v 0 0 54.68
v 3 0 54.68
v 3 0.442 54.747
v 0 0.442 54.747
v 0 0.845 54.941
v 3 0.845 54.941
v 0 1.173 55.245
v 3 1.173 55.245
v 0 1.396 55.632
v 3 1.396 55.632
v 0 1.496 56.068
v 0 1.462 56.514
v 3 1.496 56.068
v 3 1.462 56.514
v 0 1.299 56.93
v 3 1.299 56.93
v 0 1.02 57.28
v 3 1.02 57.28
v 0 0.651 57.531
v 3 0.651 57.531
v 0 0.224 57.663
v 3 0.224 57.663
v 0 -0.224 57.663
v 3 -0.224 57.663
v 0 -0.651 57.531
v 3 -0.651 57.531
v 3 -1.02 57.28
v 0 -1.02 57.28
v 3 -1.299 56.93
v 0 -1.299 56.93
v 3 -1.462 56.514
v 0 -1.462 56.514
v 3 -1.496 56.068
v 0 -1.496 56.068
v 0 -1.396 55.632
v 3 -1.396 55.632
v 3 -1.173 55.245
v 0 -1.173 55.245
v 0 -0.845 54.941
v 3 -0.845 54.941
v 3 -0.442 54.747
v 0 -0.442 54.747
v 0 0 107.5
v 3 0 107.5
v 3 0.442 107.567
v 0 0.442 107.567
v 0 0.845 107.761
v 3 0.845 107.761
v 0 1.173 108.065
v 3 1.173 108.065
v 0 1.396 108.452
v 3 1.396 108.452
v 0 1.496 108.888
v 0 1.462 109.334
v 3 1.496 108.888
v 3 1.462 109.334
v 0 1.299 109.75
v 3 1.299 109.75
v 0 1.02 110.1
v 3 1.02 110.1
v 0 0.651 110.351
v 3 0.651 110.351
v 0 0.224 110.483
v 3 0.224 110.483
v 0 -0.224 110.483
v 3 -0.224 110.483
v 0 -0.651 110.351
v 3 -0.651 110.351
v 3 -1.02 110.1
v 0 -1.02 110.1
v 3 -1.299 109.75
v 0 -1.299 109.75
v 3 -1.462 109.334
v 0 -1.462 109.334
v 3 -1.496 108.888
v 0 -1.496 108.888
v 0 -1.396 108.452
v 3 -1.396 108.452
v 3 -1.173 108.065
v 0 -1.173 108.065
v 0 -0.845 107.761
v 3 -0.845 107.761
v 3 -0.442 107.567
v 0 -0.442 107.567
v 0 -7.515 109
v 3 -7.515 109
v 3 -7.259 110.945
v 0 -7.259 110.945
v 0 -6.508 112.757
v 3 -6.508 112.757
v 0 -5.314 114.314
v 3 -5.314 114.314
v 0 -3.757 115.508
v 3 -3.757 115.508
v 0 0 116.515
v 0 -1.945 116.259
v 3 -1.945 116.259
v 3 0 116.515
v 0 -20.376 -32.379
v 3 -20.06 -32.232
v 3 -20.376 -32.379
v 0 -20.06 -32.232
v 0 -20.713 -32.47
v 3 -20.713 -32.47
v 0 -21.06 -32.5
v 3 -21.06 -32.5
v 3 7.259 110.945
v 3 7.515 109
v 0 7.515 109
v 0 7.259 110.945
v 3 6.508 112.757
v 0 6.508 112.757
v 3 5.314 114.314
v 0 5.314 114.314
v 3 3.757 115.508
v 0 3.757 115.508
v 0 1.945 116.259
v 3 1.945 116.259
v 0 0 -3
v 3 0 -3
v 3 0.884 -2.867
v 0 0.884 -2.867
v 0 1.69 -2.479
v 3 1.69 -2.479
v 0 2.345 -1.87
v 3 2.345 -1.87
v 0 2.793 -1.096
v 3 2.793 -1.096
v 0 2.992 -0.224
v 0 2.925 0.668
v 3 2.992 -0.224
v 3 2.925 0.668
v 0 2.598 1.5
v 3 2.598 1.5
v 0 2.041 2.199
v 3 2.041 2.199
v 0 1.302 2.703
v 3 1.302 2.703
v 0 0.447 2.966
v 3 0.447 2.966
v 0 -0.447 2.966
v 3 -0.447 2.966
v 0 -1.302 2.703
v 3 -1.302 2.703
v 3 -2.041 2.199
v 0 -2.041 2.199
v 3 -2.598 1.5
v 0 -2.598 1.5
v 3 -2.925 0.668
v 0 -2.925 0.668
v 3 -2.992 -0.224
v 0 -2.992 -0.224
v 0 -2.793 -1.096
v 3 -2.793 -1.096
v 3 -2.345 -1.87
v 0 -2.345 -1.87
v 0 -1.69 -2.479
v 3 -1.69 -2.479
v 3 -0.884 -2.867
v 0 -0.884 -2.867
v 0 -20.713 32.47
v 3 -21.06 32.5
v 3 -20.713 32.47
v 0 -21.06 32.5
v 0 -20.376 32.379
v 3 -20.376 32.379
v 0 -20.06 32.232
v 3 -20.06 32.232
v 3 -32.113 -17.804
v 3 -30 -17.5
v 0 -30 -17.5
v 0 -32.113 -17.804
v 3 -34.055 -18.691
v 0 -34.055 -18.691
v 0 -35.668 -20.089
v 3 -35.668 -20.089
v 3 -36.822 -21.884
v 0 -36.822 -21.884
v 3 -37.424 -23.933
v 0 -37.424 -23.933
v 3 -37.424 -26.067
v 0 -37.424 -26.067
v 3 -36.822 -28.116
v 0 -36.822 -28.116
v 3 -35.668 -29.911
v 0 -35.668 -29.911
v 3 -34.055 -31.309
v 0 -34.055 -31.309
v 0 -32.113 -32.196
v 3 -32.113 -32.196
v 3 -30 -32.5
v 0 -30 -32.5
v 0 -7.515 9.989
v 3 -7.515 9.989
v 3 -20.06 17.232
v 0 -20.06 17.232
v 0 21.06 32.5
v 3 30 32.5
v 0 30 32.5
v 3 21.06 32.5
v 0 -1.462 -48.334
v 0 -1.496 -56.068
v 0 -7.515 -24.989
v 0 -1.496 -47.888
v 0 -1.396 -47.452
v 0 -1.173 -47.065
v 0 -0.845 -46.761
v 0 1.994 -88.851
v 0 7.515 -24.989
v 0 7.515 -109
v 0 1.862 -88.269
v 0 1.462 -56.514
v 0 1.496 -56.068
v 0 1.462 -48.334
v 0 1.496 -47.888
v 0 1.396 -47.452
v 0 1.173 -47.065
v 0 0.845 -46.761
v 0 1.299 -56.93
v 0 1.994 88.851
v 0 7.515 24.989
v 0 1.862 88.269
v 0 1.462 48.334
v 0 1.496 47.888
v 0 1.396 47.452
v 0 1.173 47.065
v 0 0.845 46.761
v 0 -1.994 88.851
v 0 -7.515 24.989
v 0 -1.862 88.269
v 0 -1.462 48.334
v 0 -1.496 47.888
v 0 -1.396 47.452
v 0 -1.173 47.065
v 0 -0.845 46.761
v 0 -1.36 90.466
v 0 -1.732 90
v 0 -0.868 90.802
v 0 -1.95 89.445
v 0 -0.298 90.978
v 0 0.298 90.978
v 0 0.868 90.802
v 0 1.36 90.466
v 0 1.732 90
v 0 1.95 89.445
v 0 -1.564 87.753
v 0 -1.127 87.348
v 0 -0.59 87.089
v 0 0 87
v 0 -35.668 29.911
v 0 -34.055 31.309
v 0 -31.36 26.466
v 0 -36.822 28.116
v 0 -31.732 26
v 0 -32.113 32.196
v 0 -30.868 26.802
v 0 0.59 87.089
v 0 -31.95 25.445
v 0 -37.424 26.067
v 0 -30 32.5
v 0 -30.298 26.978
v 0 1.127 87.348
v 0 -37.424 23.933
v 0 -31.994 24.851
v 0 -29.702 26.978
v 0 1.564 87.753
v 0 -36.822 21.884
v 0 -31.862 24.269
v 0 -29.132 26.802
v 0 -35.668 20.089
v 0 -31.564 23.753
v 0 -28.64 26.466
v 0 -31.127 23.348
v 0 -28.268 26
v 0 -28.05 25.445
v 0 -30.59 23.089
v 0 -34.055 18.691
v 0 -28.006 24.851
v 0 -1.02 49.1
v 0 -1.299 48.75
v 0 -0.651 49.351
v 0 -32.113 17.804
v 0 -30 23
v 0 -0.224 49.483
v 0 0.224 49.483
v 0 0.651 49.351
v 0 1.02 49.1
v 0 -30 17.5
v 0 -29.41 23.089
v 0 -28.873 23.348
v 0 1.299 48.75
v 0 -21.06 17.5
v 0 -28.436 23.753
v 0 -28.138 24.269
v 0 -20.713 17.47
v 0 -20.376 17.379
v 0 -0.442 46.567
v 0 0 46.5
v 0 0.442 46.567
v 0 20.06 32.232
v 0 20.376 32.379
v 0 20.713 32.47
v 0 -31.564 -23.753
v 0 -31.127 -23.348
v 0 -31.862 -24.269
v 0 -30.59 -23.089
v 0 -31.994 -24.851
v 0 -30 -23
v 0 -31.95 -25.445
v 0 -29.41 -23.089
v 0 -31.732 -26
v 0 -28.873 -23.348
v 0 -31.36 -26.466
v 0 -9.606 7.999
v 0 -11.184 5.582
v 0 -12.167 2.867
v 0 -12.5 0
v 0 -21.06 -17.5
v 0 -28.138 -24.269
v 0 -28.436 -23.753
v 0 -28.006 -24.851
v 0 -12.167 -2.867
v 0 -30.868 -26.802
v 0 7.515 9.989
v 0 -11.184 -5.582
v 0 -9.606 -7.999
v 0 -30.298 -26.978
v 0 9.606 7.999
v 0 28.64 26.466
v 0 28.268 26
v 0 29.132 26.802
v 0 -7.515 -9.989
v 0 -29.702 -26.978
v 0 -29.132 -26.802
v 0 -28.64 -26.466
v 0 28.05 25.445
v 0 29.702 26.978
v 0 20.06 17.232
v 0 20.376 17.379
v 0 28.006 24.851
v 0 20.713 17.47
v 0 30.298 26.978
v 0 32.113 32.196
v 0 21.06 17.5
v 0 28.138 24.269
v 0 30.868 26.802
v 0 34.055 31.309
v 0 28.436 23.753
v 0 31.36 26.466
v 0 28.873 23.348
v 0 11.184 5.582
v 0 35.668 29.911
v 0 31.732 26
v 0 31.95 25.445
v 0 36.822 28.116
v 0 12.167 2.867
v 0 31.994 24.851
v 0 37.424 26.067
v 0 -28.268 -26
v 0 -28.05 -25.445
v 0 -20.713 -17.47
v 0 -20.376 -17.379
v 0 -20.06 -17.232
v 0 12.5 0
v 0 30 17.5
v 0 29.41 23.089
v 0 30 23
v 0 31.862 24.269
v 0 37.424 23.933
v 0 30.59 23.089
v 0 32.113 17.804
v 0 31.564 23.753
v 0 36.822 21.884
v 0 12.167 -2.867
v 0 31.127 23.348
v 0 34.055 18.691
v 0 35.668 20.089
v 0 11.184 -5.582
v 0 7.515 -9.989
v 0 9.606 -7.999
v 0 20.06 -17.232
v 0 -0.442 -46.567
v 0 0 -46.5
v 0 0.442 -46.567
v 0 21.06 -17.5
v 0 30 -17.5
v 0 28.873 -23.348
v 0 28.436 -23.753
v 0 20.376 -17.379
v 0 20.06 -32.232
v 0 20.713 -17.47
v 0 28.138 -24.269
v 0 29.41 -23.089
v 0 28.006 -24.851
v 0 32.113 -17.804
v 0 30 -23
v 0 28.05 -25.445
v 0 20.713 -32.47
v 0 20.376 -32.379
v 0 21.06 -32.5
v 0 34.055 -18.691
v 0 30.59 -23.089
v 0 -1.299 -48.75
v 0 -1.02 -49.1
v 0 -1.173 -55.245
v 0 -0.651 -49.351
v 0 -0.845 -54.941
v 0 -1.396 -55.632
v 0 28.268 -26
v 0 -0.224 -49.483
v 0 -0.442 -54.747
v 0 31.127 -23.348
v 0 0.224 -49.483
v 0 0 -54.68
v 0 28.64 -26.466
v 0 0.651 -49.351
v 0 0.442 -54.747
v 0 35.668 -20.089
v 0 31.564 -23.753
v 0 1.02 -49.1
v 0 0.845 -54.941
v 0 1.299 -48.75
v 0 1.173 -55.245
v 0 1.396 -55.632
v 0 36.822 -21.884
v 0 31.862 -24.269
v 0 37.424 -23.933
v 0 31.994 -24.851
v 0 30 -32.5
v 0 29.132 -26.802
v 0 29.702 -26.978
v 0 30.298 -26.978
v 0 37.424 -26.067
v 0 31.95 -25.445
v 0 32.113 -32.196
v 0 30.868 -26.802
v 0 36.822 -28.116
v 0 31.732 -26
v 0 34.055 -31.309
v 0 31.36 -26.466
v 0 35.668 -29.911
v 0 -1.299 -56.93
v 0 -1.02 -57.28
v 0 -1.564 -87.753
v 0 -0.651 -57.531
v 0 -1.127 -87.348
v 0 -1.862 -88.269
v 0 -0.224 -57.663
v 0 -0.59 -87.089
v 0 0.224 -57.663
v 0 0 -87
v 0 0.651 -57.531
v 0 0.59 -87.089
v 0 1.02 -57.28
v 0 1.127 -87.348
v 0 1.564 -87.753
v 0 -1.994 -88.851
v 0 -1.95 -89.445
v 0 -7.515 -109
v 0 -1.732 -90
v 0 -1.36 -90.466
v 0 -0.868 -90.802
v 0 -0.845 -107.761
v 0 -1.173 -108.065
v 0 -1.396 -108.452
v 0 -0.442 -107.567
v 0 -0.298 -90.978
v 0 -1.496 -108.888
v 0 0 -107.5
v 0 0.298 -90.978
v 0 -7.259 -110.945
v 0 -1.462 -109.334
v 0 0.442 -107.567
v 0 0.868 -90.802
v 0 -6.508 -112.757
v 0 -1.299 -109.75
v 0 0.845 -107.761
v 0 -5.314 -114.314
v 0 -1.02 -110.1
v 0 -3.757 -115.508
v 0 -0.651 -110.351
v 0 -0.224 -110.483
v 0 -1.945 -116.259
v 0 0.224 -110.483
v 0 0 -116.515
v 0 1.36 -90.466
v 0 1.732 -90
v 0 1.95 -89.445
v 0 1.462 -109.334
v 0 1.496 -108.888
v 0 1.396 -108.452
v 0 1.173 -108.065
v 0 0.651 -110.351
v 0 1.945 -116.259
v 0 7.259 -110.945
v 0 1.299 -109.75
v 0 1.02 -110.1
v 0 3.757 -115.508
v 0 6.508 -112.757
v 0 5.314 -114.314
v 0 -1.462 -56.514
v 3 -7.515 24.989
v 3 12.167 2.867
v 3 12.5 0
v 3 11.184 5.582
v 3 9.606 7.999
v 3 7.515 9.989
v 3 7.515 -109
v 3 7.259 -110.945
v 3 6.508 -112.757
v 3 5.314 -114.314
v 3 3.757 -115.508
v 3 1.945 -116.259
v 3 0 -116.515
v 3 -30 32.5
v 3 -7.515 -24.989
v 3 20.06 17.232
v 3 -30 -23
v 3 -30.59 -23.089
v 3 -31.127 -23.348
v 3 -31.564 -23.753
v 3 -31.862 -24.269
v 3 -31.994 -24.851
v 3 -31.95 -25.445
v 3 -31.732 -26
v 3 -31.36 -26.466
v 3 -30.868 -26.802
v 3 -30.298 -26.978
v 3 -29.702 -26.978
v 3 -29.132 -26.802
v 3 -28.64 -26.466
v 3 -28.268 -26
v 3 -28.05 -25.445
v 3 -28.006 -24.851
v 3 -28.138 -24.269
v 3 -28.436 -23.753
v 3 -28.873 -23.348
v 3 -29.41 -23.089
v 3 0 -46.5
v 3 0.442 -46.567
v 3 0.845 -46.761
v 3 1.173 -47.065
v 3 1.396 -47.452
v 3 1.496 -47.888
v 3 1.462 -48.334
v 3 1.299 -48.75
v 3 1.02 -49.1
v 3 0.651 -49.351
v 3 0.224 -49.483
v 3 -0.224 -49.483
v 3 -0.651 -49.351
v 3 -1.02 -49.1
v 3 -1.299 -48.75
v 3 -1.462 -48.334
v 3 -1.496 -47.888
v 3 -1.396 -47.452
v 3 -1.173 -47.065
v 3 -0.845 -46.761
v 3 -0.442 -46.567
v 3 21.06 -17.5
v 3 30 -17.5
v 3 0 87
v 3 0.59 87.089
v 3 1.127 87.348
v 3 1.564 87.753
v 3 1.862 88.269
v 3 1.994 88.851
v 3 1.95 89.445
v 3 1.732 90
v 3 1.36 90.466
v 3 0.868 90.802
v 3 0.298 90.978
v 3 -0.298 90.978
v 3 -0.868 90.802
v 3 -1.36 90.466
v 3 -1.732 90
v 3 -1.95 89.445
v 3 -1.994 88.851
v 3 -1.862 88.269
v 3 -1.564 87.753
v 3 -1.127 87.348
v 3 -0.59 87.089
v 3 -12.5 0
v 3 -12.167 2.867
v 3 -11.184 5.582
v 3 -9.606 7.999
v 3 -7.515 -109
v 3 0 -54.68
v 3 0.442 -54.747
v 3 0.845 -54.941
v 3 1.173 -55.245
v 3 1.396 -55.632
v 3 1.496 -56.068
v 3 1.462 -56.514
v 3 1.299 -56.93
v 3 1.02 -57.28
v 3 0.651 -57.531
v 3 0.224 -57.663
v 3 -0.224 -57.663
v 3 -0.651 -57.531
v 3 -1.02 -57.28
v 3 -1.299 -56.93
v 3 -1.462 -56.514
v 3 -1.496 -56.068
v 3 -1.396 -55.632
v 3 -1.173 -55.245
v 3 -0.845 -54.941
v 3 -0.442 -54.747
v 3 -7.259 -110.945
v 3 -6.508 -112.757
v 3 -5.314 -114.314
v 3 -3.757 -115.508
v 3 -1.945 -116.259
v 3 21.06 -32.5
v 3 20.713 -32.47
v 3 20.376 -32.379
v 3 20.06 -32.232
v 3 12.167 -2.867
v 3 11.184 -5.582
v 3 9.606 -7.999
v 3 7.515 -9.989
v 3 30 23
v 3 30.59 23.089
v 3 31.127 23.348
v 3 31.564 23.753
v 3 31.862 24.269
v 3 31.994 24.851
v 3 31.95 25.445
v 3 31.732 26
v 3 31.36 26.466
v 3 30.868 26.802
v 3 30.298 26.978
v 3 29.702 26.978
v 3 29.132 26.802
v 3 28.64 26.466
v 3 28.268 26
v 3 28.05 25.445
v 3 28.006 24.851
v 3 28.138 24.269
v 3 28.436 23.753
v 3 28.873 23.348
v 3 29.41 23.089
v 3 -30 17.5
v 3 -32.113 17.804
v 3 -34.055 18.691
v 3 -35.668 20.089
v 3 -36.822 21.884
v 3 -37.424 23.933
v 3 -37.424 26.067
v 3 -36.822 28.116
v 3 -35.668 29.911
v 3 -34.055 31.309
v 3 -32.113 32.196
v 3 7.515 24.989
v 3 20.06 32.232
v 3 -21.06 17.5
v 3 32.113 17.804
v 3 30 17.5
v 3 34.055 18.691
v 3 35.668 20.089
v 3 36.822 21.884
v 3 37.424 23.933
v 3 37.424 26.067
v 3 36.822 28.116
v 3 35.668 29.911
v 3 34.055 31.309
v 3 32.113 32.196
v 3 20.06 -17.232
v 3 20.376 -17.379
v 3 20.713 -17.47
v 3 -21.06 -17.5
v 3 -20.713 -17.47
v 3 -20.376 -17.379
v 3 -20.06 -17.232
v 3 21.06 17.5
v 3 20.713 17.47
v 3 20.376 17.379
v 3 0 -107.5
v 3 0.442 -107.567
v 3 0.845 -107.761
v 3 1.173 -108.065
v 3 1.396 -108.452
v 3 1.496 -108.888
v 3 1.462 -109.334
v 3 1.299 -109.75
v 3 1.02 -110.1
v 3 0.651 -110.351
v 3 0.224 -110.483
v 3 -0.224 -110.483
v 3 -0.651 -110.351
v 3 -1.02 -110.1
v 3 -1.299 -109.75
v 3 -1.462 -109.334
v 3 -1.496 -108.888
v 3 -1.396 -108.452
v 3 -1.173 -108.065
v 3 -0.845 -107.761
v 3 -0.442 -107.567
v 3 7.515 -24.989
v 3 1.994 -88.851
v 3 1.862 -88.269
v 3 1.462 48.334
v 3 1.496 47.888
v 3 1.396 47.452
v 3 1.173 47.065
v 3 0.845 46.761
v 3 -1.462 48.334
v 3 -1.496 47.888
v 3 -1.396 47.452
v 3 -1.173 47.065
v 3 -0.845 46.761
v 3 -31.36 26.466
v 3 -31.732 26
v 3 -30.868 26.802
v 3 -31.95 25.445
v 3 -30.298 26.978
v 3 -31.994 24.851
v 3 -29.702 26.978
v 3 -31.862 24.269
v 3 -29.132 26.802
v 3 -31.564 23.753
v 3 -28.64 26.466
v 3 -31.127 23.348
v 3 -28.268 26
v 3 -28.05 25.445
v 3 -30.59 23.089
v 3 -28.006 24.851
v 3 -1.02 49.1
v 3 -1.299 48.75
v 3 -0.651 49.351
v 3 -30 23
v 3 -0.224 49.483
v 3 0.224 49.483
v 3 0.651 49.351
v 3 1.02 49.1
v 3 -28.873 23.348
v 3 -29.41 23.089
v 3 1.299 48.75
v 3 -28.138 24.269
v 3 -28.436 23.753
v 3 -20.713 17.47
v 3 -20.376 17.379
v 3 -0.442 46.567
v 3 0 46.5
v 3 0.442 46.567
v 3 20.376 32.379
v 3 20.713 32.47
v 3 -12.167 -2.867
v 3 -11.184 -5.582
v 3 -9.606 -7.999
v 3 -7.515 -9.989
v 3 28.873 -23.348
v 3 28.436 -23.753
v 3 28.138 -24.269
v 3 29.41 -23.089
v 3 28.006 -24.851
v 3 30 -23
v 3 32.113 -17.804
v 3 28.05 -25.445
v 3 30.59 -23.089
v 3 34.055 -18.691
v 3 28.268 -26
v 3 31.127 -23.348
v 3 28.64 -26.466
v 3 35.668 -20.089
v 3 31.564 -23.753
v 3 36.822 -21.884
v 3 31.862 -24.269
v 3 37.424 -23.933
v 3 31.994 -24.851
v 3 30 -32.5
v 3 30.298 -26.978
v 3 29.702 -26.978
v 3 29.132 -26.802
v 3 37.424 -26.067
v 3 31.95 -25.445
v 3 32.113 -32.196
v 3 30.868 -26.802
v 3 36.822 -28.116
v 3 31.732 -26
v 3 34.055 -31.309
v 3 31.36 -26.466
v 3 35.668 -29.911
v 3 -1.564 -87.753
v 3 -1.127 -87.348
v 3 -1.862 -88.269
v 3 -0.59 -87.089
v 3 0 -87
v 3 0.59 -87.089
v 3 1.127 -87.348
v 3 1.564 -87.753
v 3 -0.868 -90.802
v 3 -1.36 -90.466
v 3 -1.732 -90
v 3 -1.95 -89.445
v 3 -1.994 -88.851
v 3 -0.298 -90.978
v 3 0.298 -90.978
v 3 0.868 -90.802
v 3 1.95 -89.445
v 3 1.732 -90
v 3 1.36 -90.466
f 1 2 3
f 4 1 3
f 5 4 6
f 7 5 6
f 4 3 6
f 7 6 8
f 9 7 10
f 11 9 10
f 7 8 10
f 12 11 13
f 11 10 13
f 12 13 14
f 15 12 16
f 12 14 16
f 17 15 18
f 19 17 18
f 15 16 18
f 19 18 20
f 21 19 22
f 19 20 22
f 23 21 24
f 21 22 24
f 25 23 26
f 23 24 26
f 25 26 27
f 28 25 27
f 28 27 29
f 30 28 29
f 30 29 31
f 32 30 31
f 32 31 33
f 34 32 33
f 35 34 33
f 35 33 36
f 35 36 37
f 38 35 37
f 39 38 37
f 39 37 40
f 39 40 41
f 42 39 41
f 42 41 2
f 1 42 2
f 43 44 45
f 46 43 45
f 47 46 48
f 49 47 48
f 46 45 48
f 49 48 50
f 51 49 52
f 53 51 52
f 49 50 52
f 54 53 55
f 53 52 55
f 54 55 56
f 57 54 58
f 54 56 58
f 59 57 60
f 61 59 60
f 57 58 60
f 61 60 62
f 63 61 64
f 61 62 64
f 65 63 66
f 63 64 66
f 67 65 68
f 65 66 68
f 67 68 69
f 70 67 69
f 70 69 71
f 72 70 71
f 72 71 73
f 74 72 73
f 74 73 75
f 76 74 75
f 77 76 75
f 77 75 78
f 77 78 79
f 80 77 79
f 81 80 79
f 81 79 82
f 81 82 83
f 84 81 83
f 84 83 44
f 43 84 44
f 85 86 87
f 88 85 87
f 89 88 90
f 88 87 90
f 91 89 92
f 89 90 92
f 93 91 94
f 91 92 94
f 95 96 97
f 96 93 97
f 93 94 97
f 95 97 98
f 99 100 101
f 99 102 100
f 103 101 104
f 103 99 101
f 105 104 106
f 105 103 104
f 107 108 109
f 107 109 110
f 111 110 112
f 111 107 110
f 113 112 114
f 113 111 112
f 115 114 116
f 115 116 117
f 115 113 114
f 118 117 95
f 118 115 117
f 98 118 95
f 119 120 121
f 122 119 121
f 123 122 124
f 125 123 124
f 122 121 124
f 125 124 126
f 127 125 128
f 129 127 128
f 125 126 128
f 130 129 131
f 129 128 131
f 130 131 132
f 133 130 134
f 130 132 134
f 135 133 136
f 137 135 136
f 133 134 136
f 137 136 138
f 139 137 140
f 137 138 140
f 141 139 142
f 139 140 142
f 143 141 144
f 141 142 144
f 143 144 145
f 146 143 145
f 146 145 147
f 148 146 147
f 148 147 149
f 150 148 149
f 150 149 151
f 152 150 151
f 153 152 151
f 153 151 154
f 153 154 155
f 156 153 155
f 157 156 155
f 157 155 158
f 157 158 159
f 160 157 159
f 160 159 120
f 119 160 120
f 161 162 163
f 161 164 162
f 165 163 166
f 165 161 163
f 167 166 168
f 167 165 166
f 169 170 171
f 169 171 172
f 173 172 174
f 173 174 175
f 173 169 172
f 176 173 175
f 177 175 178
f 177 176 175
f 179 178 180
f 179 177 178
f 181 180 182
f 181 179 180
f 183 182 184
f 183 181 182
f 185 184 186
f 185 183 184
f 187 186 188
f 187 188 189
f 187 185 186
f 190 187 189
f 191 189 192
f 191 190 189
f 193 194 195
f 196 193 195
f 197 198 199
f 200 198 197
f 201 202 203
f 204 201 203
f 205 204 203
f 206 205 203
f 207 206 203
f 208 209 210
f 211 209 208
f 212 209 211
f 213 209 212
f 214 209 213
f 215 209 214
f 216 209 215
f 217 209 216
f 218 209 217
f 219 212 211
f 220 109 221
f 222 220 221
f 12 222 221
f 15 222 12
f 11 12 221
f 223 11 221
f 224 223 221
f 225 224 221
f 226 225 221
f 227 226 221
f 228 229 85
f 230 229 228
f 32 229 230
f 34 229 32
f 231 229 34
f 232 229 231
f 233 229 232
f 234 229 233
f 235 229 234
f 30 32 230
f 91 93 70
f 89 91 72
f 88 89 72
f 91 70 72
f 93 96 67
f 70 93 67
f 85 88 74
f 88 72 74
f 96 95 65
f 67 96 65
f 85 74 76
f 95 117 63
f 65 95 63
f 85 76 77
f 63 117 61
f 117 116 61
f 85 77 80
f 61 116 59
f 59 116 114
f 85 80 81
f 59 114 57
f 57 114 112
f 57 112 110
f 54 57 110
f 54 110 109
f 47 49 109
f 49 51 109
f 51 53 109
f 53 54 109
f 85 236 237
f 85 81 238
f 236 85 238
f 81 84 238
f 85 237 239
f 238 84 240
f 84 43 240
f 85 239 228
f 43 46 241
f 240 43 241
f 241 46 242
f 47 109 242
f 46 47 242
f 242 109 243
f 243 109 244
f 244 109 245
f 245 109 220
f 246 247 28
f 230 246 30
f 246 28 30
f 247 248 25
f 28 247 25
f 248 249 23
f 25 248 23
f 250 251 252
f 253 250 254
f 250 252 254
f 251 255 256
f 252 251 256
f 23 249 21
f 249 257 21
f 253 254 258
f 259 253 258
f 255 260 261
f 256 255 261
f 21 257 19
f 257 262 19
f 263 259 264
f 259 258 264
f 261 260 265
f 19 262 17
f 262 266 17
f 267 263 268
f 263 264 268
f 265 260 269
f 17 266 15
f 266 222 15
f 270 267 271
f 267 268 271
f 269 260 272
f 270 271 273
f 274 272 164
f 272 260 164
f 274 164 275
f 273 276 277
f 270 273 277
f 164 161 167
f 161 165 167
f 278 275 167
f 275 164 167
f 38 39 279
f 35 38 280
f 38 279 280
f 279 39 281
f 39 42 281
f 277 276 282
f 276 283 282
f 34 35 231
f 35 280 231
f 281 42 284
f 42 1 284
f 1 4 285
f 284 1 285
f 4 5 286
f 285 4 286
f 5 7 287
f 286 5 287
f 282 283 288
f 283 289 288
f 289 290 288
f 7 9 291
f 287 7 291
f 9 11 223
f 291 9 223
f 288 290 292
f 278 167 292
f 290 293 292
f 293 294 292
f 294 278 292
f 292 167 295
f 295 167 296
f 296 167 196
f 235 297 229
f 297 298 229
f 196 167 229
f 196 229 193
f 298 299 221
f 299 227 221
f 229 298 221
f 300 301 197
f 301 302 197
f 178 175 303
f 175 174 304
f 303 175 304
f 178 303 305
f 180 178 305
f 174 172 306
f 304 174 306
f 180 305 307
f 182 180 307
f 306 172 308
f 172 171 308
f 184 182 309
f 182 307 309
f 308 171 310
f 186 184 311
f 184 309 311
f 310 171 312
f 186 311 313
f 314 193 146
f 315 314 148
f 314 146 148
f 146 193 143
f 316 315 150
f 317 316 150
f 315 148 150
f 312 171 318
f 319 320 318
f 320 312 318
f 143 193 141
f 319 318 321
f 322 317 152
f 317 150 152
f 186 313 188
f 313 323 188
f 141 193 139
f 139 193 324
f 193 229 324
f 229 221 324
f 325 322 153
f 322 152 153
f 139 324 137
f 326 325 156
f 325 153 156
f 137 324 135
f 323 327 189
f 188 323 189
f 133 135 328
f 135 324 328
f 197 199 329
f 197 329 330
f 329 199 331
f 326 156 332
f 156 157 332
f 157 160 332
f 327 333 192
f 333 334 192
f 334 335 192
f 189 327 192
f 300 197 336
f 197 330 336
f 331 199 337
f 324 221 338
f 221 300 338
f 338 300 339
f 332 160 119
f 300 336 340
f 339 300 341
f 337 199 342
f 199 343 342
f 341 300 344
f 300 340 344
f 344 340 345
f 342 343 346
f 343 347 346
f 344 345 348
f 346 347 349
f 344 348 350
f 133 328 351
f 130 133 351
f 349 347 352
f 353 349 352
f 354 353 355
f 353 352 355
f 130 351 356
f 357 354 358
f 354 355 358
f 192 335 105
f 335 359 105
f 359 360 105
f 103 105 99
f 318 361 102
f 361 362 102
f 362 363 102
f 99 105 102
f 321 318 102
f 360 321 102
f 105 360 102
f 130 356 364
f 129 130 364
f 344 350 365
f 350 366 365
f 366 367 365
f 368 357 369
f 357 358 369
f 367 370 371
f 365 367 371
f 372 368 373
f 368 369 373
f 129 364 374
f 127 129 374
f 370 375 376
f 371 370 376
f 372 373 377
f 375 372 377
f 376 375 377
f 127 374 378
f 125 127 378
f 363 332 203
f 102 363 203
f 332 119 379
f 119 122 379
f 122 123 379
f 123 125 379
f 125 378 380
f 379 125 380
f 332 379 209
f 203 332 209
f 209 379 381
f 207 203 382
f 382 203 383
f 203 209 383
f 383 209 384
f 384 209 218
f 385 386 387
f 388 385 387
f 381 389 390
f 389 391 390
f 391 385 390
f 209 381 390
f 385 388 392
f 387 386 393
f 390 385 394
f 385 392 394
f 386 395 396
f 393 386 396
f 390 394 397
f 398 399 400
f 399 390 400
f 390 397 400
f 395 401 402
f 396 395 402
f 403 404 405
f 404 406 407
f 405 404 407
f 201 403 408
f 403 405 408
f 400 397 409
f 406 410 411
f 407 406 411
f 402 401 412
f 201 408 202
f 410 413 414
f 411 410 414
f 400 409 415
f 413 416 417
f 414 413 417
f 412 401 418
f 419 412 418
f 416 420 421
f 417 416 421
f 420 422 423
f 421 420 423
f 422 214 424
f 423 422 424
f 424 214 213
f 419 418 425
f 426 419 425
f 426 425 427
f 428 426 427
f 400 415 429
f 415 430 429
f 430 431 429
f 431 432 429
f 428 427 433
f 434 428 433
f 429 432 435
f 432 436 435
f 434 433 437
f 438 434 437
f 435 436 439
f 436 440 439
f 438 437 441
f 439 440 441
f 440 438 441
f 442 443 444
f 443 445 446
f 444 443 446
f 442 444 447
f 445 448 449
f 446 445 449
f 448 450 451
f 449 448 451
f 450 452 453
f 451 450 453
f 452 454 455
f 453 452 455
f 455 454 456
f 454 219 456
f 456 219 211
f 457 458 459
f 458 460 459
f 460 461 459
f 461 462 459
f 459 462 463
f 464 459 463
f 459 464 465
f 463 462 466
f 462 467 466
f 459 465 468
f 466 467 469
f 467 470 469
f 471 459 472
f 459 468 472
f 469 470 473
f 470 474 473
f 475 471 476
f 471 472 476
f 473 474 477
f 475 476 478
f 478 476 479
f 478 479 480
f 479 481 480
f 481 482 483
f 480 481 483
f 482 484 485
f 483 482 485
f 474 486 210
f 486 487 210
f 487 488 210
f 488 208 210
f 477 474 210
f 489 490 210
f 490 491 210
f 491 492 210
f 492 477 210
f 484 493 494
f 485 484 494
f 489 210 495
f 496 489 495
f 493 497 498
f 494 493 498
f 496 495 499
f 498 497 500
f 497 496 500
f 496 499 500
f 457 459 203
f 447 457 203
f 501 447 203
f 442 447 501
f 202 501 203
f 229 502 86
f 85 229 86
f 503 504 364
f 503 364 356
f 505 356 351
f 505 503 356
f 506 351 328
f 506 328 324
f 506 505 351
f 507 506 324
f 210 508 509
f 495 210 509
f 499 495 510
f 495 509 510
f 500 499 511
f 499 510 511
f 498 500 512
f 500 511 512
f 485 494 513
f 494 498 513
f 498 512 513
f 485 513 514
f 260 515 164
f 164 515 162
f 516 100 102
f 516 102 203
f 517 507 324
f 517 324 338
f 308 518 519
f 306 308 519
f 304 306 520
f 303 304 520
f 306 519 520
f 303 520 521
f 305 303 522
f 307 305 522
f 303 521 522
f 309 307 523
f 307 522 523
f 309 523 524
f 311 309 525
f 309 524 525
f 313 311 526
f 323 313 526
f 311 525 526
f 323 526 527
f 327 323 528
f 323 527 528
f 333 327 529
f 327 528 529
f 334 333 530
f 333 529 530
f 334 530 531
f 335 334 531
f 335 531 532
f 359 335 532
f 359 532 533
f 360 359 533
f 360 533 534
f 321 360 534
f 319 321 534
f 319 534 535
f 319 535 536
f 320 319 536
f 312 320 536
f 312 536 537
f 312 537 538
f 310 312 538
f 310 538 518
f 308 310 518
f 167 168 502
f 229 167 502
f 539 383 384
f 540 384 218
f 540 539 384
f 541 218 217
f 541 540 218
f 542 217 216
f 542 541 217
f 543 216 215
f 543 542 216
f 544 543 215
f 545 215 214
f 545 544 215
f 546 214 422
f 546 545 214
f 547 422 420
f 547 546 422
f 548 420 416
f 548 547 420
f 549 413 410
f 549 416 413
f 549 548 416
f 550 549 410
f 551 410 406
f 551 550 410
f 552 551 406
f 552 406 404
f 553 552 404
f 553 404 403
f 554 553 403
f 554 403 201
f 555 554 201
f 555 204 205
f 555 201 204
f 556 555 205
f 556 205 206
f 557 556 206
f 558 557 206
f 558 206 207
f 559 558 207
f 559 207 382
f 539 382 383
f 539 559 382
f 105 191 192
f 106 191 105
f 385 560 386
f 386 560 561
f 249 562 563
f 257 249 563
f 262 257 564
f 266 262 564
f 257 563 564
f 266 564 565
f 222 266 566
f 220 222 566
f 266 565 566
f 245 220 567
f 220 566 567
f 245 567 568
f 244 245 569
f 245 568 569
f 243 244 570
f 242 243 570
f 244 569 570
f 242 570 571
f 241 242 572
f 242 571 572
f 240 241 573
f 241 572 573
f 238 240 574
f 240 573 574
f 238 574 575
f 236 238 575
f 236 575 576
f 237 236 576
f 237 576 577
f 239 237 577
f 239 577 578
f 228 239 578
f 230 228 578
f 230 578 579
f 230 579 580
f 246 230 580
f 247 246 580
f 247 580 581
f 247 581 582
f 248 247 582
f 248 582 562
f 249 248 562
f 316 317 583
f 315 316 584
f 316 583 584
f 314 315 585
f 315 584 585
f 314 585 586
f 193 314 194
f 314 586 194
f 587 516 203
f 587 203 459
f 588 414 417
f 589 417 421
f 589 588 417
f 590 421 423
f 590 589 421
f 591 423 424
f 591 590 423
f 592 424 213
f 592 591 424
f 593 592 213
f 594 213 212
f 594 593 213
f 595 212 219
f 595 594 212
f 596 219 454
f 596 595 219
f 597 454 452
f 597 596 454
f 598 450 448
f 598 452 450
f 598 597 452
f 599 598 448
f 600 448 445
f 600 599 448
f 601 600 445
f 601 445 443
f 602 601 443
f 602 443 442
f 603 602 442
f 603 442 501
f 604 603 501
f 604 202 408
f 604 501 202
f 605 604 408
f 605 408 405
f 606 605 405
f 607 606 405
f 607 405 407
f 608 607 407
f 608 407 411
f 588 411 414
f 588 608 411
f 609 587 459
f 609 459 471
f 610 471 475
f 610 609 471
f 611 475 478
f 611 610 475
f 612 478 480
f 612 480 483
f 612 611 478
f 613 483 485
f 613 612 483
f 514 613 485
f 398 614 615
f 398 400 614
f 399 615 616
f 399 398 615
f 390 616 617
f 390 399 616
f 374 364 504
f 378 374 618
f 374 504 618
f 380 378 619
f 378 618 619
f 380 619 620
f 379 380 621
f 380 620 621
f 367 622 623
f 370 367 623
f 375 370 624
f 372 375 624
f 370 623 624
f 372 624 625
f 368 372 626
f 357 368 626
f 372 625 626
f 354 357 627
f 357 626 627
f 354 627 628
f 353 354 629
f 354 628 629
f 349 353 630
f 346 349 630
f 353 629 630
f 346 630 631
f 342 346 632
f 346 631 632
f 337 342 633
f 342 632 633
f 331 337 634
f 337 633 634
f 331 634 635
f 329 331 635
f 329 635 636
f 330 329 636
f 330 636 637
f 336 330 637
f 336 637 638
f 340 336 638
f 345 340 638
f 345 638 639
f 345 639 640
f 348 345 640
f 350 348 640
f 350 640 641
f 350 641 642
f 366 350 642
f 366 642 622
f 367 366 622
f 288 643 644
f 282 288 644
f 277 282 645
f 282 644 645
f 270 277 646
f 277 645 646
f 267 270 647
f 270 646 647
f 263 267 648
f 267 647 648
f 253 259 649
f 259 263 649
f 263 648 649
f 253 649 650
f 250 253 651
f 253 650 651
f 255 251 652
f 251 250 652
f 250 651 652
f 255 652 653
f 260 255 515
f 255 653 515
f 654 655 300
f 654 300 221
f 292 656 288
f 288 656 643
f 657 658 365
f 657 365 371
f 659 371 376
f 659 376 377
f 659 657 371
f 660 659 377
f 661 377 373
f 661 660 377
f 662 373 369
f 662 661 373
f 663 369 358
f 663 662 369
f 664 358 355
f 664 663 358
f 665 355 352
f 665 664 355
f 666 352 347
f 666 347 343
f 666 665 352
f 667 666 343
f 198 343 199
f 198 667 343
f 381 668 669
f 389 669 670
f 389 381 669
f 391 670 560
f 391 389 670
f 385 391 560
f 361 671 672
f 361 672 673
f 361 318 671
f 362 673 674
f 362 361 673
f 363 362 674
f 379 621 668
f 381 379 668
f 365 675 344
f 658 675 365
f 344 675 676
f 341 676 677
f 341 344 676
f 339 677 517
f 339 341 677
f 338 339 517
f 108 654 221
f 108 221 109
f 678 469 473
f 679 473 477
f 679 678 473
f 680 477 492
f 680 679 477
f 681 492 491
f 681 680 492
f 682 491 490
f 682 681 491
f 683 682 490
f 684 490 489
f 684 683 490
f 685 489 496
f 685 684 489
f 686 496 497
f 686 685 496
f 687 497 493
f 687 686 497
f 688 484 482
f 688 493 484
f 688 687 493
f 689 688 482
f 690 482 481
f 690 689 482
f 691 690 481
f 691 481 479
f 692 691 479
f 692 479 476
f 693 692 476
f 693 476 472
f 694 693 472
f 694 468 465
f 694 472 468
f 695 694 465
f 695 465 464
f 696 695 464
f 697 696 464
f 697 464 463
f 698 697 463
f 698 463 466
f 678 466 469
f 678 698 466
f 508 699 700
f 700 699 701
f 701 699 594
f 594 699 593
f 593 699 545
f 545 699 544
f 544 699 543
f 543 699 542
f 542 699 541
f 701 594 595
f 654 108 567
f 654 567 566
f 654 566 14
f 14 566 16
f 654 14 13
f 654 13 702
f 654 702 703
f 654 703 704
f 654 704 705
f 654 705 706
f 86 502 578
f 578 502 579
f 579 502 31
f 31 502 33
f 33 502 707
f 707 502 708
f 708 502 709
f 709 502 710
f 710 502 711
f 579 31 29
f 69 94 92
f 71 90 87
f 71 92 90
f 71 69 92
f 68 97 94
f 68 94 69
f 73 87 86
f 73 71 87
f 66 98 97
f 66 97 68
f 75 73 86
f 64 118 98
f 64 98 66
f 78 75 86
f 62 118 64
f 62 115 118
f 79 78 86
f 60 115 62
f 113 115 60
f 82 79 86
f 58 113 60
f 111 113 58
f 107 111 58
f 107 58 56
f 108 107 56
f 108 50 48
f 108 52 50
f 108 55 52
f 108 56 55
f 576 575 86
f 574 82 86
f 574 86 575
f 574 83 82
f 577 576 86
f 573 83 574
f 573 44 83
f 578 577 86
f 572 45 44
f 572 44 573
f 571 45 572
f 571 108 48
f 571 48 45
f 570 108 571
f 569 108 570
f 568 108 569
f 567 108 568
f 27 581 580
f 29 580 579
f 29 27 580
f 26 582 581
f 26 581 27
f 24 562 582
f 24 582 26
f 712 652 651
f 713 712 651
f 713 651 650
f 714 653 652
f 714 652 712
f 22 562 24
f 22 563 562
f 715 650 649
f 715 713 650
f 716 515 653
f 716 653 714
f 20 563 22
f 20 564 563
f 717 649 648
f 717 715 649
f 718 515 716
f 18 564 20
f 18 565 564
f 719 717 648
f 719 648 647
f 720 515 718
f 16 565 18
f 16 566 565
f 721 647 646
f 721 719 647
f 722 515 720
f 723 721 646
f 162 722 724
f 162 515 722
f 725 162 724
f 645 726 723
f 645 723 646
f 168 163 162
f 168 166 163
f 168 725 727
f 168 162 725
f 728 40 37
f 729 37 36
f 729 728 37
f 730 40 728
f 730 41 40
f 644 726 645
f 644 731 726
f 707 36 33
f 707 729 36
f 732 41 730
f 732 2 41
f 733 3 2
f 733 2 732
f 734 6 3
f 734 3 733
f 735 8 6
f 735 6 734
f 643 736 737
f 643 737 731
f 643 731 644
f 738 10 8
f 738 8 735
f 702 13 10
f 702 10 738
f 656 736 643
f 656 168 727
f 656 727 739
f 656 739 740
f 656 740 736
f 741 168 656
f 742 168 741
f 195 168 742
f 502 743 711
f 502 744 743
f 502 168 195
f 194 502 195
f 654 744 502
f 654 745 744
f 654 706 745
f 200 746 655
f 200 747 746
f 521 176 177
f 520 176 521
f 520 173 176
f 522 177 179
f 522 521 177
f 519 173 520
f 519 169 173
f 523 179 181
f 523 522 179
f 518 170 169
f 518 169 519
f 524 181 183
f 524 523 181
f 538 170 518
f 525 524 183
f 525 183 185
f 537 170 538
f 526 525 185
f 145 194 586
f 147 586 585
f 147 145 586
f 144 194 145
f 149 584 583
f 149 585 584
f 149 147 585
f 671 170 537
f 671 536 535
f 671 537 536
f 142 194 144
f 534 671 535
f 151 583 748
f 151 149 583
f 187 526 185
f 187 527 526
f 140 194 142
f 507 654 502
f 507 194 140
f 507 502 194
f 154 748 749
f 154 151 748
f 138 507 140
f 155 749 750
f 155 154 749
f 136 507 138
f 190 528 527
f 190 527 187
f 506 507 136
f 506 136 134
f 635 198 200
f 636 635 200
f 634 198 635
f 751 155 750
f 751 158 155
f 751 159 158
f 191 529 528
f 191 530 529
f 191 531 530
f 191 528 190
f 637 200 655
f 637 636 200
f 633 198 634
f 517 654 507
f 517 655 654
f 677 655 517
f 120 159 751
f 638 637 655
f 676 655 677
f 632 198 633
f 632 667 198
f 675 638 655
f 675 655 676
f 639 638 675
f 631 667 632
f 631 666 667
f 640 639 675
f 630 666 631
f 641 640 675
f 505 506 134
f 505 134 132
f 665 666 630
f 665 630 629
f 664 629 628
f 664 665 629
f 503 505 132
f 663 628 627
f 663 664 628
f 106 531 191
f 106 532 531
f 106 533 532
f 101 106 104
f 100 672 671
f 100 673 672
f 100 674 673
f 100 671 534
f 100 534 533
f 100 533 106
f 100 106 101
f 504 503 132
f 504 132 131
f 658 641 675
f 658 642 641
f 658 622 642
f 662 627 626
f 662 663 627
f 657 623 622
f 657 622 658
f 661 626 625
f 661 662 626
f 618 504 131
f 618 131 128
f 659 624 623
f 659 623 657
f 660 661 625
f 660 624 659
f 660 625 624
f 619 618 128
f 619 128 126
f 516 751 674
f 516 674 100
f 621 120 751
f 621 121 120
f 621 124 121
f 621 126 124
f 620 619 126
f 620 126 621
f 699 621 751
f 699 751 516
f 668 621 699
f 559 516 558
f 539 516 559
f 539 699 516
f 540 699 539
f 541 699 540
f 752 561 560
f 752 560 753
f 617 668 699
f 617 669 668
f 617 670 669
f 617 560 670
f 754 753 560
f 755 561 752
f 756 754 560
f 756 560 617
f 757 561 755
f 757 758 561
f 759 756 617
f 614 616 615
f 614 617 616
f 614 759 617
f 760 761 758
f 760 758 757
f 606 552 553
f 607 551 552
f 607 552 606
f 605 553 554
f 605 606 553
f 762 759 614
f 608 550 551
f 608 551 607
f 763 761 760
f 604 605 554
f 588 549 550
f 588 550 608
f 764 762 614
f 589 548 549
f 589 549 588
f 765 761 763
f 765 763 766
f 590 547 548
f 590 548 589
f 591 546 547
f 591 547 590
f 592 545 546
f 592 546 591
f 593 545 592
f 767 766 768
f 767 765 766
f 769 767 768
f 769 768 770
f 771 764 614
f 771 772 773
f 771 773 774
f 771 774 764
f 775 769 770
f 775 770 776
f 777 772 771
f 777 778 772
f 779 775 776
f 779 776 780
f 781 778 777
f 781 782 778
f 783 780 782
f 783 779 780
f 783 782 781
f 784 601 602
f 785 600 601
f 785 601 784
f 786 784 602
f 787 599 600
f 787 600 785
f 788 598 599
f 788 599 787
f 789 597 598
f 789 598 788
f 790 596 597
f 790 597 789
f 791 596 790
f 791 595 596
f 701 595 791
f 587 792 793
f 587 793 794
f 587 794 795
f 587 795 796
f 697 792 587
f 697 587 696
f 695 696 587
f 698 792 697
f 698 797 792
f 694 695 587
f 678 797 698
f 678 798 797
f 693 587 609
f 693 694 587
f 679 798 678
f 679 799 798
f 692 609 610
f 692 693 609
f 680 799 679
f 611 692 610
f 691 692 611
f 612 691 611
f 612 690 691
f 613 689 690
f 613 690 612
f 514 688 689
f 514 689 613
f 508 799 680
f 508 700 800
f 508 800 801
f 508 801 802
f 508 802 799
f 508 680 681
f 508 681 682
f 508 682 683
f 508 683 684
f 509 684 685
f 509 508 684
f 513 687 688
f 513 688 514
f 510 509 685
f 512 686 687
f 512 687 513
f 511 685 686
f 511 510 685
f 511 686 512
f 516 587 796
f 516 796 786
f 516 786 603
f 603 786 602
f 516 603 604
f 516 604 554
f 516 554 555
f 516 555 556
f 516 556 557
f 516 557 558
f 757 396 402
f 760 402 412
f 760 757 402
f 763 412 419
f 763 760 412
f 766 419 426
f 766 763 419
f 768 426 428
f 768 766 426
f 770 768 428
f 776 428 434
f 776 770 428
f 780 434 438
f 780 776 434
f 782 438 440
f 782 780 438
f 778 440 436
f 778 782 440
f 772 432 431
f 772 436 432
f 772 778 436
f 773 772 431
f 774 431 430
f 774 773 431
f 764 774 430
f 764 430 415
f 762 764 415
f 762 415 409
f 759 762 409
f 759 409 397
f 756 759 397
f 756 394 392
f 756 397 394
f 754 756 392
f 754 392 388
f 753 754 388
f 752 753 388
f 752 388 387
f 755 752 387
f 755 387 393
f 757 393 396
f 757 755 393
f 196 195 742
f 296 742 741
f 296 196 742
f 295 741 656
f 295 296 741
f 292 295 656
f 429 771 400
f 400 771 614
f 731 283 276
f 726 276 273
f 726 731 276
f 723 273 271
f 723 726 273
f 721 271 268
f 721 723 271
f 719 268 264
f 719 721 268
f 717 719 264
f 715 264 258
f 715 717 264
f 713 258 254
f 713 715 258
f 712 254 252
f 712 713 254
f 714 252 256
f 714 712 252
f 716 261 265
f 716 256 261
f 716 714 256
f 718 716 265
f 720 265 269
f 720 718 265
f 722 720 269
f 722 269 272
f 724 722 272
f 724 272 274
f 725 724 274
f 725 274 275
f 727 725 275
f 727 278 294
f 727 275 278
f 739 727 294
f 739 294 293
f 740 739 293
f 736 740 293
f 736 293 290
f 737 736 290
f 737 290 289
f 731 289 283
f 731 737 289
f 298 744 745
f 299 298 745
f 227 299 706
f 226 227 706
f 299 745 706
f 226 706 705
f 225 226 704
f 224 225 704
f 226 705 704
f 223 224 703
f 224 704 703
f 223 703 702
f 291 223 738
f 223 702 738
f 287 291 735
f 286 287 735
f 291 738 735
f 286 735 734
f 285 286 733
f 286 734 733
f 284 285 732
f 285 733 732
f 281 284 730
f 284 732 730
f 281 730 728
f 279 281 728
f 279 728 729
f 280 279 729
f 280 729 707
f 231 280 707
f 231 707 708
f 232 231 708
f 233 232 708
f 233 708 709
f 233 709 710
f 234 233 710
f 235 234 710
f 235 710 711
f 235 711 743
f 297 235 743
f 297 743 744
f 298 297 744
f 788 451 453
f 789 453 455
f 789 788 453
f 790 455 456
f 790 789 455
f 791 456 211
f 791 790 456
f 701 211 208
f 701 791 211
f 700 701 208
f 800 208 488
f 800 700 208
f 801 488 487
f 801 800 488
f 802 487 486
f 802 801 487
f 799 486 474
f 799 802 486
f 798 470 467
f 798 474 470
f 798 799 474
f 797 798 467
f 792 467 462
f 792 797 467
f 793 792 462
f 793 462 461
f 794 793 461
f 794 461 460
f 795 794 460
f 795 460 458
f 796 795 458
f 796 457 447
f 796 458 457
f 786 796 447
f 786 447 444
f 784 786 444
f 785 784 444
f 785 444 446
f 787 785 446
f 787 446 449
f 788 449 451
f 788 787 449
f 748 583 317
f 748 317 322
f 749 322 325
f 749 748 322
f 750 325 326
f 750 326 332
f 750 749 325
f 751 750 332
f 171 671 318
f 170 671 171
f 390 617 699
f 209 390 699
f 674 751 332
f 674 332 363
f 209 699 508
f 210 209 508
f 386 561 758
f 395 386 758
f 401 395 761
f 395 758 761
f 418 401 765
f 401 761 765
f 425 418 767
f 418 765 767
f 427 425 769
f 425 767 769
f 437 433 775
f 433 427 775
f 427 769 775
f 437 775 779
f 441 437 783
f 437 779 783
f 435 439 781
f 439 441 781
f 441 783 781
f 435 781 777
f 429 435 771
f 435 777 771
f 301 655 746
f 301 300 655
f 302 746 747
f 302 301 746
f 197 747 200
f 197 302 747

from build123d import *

# Parameters (mm, degrees)
SKETCH1_W               = 250
SKETCH1_H               = 90
BOSS_EXTRUDE1_DEPTH     = 3
SKETCH2_R               = 3
SKETCH2_R_2             = 1.5
SKETCH2_R_3             = 2
CUT_EXTRUDE1_DEPTH      = 4
SKETCH3_R               = 2
CUT_EXTRUDE2_DEPTH      = 4
CUT_EXTRUDE3_DEPTH      = 4
MIRROR2_COPY_1_SKETCH_R = 2
MIRROR2_COPY_1_DEPTH    = 4
MIRROR2_COPY_2_DEPTH    = 4
FILLET2_R               = 2


with BuildPart() as part:
    # Sketch1 → Boss-Extrude1 (new body)
    with BuildSketch(Plane(origin=(0, 0, 0), x_dir=(0, 0, -1), z_dir=(1, 0, 0))):
        Rectangle(SKETCH1_W, SKETCH1_H)
    extrude(amount=BOSS_EXTRUDE1_DEPTH)

    # Sketch2 → Cut-Extrude1 (cut, through all)
    with BuildSketch(Plane(origin=(3, 0, 0), x_dir=(0, 0, -1), z_dir=(1, 0, 0))):
        Circle(SKETCH2_R)
        with Locations((-48, 0)):
            Circle(SKETCH2_R_2)
        with Locations((-89, 0)):
            Circle(SKETCH2_R_3)
        with Locations((-109, 0)):
            Circle(SKETCH2_R_2)
        with Locations((-56.18, 0)):
            Circle(SKETCH2_R_2)
    cut_extrude1 = extrude(amount=-CUT_EXTRUDE1_DEPTH, mode=Mode.SUBTRACT)

    # Sketch3 → Cut-Extrude2 (cut, through all)
    with BuildSketch(Plane(origin=(3, 0, 0), x_dir=(0, 0, -1), z_dir=(1, 0, 0))):
        with Locations((-25, 30)):
            Circle(SKETCH3_R)
    cut_extrude2 = extrude(amount=-CUT_EXTRUDE2_DEPTH, mode=Mode.SUBTRACT)

    # Sketch4 → Cut-Extrude3 (cut, through all)
    with BuildSketch(Plane(origin=(3, 0, 0), x_dir=(0, 0, -1), z_dir=(1, 0, 0))):
        with BuildLine():
            Line((-125, 1.99556796), (-125, 45))
            Line((-125, 45), (0, 45))
            Line((0, 45), (0, 12.5))
            ThreePointArc((0, 12.5), (-5.582012149, 11.184415066), (-9.989046524, 7.514582459))
            Line((-9.989046524, 7.514582459), (-17.5, 20.523935493))
            Line((-17.5, 20.523935493), (-17.5, 30))
            ThreePointArc((-17.5, 30), (-25, 37.5), (-32.5, 30))
            Line((-32.5, 30), (-32.5, 20.523935493))
            Line((-32.5, 20.523935493), (-24.989046524, 7.514582459))
            Line((-24.989046524, 7.514582459), (-109, 7.514582459))
            ThreePointArc((-109, 7.514582459), (-114.313612215, 5.313612215), (-116.514582459, 0))
            Line((-116.514582459, 0), (-125, 0))
            Line((-125, 0), (-125, 1.99556796))
        make_face()
    cut_extrude3 = extrude(amount=-CUT_EXTRUDE3_DEPTH, mode=Mode.SUBTRACT)

    # Mirror1: Cut-Extrude2, Cut-Extrude3 across plane
    add(cut_extrude2.mirror(Plane.ZX), mode=Mode.SUBTRACT)
    add(cut_extrude3.mirror(Plane.ZX), mode=Mode.SUBTRACT)

    # Mirror2: Cut-Extrude1, Cut-Extrude2, Cut-Extrude3 across plane
    add(cut_extrude1.mirror(Plane.XY), mode=Mode.SUBTRACT)
    add(cut_extrude2.mirror(Plane.XY), mode=Mode.SUBTRACT)
    add(cut_extrude3.mirror(Plane.XY), mode=Mode.SUBTRACT)

    # Mirror2 copy 1 sketch → Mirror2 copy 1 (cut, through all)
    with BuildSketch(Plane(origin=(3, 0, 0), x_dir=(0, 0, 1), z_dir=(1, 0, 0))):
        with Locations((-25, 30)):
            Circle(MIRROR2_COPY_1_SKETCH_R)
    extrude(amount=-MIRROR2_COPY_1_DEPTH, mode=Mode.SUBTRACT)

    # Mirror2 copy 2 sketch → Mirror2 copy 2 (cut, through all)
    with BuildSketch(Plane(origin=(3, 0, 0), x_dir=(0, 0, 1), z_dir=(1, 0, 0))):
        with BuildLine():
            Line((-125, 1.99556796), (-125, 45))
            Line((-125, 45), (0, 45))
            Line((0, 45), (0, 12.5))
            ThreePointArc((0, 12.5), (-5.582012149, 11.184415066), (-9.989046524, 7.514582459))
            Line((-9.989046524, 7.514582459), (-17.5, 20.523935493))
            Line((-17.5, 20.523935493), (-17.5, 30))
            ThreePointArc((-17.5, 30), (-25, 37.5), (-32.5, 30))
            Line((-32.5, 30), (-32.5, 20.523935493))
            Line((-32.5, 20.523935493), (-24.989046524, 7.514582459))
            Line((-24.989046524, 7.514582459), (-109, 7.514582459))
            ThreePointArc((-109, 7.514582459), (-114.313612215, 5.313612215), (-116.514582459, 0))
            Line((-116.514582459, 0), (-125, 0))
            Line((-125, 0), (-125, 1.99556796))
        make_face()
    extrude(amount=-MIRROR2_COPY_2_DEPTH, mode=Mode.SUBTRACT)

    # Fillet2
    fillet2_edges = [part.edges().sort_by_distance(p)[0] for p in [
        (1.5, -20.523935493, -32.5),
        (1.5, -20.523935493, -17.5),
        (1.5, 20.523935493, -17.5),
        (1.5, 20.523935493, -32.5),
        (1.5, 20.523935493, 32.5),
        (1.5, 20.523935493, 17.5),
        (1.5, -20.523935493, 17.5),
        (1.5, -20.523935493, 32.5),
    ]]
    fillet(fillet2_edges, radius=FILLET2_R)


solid = part.part
